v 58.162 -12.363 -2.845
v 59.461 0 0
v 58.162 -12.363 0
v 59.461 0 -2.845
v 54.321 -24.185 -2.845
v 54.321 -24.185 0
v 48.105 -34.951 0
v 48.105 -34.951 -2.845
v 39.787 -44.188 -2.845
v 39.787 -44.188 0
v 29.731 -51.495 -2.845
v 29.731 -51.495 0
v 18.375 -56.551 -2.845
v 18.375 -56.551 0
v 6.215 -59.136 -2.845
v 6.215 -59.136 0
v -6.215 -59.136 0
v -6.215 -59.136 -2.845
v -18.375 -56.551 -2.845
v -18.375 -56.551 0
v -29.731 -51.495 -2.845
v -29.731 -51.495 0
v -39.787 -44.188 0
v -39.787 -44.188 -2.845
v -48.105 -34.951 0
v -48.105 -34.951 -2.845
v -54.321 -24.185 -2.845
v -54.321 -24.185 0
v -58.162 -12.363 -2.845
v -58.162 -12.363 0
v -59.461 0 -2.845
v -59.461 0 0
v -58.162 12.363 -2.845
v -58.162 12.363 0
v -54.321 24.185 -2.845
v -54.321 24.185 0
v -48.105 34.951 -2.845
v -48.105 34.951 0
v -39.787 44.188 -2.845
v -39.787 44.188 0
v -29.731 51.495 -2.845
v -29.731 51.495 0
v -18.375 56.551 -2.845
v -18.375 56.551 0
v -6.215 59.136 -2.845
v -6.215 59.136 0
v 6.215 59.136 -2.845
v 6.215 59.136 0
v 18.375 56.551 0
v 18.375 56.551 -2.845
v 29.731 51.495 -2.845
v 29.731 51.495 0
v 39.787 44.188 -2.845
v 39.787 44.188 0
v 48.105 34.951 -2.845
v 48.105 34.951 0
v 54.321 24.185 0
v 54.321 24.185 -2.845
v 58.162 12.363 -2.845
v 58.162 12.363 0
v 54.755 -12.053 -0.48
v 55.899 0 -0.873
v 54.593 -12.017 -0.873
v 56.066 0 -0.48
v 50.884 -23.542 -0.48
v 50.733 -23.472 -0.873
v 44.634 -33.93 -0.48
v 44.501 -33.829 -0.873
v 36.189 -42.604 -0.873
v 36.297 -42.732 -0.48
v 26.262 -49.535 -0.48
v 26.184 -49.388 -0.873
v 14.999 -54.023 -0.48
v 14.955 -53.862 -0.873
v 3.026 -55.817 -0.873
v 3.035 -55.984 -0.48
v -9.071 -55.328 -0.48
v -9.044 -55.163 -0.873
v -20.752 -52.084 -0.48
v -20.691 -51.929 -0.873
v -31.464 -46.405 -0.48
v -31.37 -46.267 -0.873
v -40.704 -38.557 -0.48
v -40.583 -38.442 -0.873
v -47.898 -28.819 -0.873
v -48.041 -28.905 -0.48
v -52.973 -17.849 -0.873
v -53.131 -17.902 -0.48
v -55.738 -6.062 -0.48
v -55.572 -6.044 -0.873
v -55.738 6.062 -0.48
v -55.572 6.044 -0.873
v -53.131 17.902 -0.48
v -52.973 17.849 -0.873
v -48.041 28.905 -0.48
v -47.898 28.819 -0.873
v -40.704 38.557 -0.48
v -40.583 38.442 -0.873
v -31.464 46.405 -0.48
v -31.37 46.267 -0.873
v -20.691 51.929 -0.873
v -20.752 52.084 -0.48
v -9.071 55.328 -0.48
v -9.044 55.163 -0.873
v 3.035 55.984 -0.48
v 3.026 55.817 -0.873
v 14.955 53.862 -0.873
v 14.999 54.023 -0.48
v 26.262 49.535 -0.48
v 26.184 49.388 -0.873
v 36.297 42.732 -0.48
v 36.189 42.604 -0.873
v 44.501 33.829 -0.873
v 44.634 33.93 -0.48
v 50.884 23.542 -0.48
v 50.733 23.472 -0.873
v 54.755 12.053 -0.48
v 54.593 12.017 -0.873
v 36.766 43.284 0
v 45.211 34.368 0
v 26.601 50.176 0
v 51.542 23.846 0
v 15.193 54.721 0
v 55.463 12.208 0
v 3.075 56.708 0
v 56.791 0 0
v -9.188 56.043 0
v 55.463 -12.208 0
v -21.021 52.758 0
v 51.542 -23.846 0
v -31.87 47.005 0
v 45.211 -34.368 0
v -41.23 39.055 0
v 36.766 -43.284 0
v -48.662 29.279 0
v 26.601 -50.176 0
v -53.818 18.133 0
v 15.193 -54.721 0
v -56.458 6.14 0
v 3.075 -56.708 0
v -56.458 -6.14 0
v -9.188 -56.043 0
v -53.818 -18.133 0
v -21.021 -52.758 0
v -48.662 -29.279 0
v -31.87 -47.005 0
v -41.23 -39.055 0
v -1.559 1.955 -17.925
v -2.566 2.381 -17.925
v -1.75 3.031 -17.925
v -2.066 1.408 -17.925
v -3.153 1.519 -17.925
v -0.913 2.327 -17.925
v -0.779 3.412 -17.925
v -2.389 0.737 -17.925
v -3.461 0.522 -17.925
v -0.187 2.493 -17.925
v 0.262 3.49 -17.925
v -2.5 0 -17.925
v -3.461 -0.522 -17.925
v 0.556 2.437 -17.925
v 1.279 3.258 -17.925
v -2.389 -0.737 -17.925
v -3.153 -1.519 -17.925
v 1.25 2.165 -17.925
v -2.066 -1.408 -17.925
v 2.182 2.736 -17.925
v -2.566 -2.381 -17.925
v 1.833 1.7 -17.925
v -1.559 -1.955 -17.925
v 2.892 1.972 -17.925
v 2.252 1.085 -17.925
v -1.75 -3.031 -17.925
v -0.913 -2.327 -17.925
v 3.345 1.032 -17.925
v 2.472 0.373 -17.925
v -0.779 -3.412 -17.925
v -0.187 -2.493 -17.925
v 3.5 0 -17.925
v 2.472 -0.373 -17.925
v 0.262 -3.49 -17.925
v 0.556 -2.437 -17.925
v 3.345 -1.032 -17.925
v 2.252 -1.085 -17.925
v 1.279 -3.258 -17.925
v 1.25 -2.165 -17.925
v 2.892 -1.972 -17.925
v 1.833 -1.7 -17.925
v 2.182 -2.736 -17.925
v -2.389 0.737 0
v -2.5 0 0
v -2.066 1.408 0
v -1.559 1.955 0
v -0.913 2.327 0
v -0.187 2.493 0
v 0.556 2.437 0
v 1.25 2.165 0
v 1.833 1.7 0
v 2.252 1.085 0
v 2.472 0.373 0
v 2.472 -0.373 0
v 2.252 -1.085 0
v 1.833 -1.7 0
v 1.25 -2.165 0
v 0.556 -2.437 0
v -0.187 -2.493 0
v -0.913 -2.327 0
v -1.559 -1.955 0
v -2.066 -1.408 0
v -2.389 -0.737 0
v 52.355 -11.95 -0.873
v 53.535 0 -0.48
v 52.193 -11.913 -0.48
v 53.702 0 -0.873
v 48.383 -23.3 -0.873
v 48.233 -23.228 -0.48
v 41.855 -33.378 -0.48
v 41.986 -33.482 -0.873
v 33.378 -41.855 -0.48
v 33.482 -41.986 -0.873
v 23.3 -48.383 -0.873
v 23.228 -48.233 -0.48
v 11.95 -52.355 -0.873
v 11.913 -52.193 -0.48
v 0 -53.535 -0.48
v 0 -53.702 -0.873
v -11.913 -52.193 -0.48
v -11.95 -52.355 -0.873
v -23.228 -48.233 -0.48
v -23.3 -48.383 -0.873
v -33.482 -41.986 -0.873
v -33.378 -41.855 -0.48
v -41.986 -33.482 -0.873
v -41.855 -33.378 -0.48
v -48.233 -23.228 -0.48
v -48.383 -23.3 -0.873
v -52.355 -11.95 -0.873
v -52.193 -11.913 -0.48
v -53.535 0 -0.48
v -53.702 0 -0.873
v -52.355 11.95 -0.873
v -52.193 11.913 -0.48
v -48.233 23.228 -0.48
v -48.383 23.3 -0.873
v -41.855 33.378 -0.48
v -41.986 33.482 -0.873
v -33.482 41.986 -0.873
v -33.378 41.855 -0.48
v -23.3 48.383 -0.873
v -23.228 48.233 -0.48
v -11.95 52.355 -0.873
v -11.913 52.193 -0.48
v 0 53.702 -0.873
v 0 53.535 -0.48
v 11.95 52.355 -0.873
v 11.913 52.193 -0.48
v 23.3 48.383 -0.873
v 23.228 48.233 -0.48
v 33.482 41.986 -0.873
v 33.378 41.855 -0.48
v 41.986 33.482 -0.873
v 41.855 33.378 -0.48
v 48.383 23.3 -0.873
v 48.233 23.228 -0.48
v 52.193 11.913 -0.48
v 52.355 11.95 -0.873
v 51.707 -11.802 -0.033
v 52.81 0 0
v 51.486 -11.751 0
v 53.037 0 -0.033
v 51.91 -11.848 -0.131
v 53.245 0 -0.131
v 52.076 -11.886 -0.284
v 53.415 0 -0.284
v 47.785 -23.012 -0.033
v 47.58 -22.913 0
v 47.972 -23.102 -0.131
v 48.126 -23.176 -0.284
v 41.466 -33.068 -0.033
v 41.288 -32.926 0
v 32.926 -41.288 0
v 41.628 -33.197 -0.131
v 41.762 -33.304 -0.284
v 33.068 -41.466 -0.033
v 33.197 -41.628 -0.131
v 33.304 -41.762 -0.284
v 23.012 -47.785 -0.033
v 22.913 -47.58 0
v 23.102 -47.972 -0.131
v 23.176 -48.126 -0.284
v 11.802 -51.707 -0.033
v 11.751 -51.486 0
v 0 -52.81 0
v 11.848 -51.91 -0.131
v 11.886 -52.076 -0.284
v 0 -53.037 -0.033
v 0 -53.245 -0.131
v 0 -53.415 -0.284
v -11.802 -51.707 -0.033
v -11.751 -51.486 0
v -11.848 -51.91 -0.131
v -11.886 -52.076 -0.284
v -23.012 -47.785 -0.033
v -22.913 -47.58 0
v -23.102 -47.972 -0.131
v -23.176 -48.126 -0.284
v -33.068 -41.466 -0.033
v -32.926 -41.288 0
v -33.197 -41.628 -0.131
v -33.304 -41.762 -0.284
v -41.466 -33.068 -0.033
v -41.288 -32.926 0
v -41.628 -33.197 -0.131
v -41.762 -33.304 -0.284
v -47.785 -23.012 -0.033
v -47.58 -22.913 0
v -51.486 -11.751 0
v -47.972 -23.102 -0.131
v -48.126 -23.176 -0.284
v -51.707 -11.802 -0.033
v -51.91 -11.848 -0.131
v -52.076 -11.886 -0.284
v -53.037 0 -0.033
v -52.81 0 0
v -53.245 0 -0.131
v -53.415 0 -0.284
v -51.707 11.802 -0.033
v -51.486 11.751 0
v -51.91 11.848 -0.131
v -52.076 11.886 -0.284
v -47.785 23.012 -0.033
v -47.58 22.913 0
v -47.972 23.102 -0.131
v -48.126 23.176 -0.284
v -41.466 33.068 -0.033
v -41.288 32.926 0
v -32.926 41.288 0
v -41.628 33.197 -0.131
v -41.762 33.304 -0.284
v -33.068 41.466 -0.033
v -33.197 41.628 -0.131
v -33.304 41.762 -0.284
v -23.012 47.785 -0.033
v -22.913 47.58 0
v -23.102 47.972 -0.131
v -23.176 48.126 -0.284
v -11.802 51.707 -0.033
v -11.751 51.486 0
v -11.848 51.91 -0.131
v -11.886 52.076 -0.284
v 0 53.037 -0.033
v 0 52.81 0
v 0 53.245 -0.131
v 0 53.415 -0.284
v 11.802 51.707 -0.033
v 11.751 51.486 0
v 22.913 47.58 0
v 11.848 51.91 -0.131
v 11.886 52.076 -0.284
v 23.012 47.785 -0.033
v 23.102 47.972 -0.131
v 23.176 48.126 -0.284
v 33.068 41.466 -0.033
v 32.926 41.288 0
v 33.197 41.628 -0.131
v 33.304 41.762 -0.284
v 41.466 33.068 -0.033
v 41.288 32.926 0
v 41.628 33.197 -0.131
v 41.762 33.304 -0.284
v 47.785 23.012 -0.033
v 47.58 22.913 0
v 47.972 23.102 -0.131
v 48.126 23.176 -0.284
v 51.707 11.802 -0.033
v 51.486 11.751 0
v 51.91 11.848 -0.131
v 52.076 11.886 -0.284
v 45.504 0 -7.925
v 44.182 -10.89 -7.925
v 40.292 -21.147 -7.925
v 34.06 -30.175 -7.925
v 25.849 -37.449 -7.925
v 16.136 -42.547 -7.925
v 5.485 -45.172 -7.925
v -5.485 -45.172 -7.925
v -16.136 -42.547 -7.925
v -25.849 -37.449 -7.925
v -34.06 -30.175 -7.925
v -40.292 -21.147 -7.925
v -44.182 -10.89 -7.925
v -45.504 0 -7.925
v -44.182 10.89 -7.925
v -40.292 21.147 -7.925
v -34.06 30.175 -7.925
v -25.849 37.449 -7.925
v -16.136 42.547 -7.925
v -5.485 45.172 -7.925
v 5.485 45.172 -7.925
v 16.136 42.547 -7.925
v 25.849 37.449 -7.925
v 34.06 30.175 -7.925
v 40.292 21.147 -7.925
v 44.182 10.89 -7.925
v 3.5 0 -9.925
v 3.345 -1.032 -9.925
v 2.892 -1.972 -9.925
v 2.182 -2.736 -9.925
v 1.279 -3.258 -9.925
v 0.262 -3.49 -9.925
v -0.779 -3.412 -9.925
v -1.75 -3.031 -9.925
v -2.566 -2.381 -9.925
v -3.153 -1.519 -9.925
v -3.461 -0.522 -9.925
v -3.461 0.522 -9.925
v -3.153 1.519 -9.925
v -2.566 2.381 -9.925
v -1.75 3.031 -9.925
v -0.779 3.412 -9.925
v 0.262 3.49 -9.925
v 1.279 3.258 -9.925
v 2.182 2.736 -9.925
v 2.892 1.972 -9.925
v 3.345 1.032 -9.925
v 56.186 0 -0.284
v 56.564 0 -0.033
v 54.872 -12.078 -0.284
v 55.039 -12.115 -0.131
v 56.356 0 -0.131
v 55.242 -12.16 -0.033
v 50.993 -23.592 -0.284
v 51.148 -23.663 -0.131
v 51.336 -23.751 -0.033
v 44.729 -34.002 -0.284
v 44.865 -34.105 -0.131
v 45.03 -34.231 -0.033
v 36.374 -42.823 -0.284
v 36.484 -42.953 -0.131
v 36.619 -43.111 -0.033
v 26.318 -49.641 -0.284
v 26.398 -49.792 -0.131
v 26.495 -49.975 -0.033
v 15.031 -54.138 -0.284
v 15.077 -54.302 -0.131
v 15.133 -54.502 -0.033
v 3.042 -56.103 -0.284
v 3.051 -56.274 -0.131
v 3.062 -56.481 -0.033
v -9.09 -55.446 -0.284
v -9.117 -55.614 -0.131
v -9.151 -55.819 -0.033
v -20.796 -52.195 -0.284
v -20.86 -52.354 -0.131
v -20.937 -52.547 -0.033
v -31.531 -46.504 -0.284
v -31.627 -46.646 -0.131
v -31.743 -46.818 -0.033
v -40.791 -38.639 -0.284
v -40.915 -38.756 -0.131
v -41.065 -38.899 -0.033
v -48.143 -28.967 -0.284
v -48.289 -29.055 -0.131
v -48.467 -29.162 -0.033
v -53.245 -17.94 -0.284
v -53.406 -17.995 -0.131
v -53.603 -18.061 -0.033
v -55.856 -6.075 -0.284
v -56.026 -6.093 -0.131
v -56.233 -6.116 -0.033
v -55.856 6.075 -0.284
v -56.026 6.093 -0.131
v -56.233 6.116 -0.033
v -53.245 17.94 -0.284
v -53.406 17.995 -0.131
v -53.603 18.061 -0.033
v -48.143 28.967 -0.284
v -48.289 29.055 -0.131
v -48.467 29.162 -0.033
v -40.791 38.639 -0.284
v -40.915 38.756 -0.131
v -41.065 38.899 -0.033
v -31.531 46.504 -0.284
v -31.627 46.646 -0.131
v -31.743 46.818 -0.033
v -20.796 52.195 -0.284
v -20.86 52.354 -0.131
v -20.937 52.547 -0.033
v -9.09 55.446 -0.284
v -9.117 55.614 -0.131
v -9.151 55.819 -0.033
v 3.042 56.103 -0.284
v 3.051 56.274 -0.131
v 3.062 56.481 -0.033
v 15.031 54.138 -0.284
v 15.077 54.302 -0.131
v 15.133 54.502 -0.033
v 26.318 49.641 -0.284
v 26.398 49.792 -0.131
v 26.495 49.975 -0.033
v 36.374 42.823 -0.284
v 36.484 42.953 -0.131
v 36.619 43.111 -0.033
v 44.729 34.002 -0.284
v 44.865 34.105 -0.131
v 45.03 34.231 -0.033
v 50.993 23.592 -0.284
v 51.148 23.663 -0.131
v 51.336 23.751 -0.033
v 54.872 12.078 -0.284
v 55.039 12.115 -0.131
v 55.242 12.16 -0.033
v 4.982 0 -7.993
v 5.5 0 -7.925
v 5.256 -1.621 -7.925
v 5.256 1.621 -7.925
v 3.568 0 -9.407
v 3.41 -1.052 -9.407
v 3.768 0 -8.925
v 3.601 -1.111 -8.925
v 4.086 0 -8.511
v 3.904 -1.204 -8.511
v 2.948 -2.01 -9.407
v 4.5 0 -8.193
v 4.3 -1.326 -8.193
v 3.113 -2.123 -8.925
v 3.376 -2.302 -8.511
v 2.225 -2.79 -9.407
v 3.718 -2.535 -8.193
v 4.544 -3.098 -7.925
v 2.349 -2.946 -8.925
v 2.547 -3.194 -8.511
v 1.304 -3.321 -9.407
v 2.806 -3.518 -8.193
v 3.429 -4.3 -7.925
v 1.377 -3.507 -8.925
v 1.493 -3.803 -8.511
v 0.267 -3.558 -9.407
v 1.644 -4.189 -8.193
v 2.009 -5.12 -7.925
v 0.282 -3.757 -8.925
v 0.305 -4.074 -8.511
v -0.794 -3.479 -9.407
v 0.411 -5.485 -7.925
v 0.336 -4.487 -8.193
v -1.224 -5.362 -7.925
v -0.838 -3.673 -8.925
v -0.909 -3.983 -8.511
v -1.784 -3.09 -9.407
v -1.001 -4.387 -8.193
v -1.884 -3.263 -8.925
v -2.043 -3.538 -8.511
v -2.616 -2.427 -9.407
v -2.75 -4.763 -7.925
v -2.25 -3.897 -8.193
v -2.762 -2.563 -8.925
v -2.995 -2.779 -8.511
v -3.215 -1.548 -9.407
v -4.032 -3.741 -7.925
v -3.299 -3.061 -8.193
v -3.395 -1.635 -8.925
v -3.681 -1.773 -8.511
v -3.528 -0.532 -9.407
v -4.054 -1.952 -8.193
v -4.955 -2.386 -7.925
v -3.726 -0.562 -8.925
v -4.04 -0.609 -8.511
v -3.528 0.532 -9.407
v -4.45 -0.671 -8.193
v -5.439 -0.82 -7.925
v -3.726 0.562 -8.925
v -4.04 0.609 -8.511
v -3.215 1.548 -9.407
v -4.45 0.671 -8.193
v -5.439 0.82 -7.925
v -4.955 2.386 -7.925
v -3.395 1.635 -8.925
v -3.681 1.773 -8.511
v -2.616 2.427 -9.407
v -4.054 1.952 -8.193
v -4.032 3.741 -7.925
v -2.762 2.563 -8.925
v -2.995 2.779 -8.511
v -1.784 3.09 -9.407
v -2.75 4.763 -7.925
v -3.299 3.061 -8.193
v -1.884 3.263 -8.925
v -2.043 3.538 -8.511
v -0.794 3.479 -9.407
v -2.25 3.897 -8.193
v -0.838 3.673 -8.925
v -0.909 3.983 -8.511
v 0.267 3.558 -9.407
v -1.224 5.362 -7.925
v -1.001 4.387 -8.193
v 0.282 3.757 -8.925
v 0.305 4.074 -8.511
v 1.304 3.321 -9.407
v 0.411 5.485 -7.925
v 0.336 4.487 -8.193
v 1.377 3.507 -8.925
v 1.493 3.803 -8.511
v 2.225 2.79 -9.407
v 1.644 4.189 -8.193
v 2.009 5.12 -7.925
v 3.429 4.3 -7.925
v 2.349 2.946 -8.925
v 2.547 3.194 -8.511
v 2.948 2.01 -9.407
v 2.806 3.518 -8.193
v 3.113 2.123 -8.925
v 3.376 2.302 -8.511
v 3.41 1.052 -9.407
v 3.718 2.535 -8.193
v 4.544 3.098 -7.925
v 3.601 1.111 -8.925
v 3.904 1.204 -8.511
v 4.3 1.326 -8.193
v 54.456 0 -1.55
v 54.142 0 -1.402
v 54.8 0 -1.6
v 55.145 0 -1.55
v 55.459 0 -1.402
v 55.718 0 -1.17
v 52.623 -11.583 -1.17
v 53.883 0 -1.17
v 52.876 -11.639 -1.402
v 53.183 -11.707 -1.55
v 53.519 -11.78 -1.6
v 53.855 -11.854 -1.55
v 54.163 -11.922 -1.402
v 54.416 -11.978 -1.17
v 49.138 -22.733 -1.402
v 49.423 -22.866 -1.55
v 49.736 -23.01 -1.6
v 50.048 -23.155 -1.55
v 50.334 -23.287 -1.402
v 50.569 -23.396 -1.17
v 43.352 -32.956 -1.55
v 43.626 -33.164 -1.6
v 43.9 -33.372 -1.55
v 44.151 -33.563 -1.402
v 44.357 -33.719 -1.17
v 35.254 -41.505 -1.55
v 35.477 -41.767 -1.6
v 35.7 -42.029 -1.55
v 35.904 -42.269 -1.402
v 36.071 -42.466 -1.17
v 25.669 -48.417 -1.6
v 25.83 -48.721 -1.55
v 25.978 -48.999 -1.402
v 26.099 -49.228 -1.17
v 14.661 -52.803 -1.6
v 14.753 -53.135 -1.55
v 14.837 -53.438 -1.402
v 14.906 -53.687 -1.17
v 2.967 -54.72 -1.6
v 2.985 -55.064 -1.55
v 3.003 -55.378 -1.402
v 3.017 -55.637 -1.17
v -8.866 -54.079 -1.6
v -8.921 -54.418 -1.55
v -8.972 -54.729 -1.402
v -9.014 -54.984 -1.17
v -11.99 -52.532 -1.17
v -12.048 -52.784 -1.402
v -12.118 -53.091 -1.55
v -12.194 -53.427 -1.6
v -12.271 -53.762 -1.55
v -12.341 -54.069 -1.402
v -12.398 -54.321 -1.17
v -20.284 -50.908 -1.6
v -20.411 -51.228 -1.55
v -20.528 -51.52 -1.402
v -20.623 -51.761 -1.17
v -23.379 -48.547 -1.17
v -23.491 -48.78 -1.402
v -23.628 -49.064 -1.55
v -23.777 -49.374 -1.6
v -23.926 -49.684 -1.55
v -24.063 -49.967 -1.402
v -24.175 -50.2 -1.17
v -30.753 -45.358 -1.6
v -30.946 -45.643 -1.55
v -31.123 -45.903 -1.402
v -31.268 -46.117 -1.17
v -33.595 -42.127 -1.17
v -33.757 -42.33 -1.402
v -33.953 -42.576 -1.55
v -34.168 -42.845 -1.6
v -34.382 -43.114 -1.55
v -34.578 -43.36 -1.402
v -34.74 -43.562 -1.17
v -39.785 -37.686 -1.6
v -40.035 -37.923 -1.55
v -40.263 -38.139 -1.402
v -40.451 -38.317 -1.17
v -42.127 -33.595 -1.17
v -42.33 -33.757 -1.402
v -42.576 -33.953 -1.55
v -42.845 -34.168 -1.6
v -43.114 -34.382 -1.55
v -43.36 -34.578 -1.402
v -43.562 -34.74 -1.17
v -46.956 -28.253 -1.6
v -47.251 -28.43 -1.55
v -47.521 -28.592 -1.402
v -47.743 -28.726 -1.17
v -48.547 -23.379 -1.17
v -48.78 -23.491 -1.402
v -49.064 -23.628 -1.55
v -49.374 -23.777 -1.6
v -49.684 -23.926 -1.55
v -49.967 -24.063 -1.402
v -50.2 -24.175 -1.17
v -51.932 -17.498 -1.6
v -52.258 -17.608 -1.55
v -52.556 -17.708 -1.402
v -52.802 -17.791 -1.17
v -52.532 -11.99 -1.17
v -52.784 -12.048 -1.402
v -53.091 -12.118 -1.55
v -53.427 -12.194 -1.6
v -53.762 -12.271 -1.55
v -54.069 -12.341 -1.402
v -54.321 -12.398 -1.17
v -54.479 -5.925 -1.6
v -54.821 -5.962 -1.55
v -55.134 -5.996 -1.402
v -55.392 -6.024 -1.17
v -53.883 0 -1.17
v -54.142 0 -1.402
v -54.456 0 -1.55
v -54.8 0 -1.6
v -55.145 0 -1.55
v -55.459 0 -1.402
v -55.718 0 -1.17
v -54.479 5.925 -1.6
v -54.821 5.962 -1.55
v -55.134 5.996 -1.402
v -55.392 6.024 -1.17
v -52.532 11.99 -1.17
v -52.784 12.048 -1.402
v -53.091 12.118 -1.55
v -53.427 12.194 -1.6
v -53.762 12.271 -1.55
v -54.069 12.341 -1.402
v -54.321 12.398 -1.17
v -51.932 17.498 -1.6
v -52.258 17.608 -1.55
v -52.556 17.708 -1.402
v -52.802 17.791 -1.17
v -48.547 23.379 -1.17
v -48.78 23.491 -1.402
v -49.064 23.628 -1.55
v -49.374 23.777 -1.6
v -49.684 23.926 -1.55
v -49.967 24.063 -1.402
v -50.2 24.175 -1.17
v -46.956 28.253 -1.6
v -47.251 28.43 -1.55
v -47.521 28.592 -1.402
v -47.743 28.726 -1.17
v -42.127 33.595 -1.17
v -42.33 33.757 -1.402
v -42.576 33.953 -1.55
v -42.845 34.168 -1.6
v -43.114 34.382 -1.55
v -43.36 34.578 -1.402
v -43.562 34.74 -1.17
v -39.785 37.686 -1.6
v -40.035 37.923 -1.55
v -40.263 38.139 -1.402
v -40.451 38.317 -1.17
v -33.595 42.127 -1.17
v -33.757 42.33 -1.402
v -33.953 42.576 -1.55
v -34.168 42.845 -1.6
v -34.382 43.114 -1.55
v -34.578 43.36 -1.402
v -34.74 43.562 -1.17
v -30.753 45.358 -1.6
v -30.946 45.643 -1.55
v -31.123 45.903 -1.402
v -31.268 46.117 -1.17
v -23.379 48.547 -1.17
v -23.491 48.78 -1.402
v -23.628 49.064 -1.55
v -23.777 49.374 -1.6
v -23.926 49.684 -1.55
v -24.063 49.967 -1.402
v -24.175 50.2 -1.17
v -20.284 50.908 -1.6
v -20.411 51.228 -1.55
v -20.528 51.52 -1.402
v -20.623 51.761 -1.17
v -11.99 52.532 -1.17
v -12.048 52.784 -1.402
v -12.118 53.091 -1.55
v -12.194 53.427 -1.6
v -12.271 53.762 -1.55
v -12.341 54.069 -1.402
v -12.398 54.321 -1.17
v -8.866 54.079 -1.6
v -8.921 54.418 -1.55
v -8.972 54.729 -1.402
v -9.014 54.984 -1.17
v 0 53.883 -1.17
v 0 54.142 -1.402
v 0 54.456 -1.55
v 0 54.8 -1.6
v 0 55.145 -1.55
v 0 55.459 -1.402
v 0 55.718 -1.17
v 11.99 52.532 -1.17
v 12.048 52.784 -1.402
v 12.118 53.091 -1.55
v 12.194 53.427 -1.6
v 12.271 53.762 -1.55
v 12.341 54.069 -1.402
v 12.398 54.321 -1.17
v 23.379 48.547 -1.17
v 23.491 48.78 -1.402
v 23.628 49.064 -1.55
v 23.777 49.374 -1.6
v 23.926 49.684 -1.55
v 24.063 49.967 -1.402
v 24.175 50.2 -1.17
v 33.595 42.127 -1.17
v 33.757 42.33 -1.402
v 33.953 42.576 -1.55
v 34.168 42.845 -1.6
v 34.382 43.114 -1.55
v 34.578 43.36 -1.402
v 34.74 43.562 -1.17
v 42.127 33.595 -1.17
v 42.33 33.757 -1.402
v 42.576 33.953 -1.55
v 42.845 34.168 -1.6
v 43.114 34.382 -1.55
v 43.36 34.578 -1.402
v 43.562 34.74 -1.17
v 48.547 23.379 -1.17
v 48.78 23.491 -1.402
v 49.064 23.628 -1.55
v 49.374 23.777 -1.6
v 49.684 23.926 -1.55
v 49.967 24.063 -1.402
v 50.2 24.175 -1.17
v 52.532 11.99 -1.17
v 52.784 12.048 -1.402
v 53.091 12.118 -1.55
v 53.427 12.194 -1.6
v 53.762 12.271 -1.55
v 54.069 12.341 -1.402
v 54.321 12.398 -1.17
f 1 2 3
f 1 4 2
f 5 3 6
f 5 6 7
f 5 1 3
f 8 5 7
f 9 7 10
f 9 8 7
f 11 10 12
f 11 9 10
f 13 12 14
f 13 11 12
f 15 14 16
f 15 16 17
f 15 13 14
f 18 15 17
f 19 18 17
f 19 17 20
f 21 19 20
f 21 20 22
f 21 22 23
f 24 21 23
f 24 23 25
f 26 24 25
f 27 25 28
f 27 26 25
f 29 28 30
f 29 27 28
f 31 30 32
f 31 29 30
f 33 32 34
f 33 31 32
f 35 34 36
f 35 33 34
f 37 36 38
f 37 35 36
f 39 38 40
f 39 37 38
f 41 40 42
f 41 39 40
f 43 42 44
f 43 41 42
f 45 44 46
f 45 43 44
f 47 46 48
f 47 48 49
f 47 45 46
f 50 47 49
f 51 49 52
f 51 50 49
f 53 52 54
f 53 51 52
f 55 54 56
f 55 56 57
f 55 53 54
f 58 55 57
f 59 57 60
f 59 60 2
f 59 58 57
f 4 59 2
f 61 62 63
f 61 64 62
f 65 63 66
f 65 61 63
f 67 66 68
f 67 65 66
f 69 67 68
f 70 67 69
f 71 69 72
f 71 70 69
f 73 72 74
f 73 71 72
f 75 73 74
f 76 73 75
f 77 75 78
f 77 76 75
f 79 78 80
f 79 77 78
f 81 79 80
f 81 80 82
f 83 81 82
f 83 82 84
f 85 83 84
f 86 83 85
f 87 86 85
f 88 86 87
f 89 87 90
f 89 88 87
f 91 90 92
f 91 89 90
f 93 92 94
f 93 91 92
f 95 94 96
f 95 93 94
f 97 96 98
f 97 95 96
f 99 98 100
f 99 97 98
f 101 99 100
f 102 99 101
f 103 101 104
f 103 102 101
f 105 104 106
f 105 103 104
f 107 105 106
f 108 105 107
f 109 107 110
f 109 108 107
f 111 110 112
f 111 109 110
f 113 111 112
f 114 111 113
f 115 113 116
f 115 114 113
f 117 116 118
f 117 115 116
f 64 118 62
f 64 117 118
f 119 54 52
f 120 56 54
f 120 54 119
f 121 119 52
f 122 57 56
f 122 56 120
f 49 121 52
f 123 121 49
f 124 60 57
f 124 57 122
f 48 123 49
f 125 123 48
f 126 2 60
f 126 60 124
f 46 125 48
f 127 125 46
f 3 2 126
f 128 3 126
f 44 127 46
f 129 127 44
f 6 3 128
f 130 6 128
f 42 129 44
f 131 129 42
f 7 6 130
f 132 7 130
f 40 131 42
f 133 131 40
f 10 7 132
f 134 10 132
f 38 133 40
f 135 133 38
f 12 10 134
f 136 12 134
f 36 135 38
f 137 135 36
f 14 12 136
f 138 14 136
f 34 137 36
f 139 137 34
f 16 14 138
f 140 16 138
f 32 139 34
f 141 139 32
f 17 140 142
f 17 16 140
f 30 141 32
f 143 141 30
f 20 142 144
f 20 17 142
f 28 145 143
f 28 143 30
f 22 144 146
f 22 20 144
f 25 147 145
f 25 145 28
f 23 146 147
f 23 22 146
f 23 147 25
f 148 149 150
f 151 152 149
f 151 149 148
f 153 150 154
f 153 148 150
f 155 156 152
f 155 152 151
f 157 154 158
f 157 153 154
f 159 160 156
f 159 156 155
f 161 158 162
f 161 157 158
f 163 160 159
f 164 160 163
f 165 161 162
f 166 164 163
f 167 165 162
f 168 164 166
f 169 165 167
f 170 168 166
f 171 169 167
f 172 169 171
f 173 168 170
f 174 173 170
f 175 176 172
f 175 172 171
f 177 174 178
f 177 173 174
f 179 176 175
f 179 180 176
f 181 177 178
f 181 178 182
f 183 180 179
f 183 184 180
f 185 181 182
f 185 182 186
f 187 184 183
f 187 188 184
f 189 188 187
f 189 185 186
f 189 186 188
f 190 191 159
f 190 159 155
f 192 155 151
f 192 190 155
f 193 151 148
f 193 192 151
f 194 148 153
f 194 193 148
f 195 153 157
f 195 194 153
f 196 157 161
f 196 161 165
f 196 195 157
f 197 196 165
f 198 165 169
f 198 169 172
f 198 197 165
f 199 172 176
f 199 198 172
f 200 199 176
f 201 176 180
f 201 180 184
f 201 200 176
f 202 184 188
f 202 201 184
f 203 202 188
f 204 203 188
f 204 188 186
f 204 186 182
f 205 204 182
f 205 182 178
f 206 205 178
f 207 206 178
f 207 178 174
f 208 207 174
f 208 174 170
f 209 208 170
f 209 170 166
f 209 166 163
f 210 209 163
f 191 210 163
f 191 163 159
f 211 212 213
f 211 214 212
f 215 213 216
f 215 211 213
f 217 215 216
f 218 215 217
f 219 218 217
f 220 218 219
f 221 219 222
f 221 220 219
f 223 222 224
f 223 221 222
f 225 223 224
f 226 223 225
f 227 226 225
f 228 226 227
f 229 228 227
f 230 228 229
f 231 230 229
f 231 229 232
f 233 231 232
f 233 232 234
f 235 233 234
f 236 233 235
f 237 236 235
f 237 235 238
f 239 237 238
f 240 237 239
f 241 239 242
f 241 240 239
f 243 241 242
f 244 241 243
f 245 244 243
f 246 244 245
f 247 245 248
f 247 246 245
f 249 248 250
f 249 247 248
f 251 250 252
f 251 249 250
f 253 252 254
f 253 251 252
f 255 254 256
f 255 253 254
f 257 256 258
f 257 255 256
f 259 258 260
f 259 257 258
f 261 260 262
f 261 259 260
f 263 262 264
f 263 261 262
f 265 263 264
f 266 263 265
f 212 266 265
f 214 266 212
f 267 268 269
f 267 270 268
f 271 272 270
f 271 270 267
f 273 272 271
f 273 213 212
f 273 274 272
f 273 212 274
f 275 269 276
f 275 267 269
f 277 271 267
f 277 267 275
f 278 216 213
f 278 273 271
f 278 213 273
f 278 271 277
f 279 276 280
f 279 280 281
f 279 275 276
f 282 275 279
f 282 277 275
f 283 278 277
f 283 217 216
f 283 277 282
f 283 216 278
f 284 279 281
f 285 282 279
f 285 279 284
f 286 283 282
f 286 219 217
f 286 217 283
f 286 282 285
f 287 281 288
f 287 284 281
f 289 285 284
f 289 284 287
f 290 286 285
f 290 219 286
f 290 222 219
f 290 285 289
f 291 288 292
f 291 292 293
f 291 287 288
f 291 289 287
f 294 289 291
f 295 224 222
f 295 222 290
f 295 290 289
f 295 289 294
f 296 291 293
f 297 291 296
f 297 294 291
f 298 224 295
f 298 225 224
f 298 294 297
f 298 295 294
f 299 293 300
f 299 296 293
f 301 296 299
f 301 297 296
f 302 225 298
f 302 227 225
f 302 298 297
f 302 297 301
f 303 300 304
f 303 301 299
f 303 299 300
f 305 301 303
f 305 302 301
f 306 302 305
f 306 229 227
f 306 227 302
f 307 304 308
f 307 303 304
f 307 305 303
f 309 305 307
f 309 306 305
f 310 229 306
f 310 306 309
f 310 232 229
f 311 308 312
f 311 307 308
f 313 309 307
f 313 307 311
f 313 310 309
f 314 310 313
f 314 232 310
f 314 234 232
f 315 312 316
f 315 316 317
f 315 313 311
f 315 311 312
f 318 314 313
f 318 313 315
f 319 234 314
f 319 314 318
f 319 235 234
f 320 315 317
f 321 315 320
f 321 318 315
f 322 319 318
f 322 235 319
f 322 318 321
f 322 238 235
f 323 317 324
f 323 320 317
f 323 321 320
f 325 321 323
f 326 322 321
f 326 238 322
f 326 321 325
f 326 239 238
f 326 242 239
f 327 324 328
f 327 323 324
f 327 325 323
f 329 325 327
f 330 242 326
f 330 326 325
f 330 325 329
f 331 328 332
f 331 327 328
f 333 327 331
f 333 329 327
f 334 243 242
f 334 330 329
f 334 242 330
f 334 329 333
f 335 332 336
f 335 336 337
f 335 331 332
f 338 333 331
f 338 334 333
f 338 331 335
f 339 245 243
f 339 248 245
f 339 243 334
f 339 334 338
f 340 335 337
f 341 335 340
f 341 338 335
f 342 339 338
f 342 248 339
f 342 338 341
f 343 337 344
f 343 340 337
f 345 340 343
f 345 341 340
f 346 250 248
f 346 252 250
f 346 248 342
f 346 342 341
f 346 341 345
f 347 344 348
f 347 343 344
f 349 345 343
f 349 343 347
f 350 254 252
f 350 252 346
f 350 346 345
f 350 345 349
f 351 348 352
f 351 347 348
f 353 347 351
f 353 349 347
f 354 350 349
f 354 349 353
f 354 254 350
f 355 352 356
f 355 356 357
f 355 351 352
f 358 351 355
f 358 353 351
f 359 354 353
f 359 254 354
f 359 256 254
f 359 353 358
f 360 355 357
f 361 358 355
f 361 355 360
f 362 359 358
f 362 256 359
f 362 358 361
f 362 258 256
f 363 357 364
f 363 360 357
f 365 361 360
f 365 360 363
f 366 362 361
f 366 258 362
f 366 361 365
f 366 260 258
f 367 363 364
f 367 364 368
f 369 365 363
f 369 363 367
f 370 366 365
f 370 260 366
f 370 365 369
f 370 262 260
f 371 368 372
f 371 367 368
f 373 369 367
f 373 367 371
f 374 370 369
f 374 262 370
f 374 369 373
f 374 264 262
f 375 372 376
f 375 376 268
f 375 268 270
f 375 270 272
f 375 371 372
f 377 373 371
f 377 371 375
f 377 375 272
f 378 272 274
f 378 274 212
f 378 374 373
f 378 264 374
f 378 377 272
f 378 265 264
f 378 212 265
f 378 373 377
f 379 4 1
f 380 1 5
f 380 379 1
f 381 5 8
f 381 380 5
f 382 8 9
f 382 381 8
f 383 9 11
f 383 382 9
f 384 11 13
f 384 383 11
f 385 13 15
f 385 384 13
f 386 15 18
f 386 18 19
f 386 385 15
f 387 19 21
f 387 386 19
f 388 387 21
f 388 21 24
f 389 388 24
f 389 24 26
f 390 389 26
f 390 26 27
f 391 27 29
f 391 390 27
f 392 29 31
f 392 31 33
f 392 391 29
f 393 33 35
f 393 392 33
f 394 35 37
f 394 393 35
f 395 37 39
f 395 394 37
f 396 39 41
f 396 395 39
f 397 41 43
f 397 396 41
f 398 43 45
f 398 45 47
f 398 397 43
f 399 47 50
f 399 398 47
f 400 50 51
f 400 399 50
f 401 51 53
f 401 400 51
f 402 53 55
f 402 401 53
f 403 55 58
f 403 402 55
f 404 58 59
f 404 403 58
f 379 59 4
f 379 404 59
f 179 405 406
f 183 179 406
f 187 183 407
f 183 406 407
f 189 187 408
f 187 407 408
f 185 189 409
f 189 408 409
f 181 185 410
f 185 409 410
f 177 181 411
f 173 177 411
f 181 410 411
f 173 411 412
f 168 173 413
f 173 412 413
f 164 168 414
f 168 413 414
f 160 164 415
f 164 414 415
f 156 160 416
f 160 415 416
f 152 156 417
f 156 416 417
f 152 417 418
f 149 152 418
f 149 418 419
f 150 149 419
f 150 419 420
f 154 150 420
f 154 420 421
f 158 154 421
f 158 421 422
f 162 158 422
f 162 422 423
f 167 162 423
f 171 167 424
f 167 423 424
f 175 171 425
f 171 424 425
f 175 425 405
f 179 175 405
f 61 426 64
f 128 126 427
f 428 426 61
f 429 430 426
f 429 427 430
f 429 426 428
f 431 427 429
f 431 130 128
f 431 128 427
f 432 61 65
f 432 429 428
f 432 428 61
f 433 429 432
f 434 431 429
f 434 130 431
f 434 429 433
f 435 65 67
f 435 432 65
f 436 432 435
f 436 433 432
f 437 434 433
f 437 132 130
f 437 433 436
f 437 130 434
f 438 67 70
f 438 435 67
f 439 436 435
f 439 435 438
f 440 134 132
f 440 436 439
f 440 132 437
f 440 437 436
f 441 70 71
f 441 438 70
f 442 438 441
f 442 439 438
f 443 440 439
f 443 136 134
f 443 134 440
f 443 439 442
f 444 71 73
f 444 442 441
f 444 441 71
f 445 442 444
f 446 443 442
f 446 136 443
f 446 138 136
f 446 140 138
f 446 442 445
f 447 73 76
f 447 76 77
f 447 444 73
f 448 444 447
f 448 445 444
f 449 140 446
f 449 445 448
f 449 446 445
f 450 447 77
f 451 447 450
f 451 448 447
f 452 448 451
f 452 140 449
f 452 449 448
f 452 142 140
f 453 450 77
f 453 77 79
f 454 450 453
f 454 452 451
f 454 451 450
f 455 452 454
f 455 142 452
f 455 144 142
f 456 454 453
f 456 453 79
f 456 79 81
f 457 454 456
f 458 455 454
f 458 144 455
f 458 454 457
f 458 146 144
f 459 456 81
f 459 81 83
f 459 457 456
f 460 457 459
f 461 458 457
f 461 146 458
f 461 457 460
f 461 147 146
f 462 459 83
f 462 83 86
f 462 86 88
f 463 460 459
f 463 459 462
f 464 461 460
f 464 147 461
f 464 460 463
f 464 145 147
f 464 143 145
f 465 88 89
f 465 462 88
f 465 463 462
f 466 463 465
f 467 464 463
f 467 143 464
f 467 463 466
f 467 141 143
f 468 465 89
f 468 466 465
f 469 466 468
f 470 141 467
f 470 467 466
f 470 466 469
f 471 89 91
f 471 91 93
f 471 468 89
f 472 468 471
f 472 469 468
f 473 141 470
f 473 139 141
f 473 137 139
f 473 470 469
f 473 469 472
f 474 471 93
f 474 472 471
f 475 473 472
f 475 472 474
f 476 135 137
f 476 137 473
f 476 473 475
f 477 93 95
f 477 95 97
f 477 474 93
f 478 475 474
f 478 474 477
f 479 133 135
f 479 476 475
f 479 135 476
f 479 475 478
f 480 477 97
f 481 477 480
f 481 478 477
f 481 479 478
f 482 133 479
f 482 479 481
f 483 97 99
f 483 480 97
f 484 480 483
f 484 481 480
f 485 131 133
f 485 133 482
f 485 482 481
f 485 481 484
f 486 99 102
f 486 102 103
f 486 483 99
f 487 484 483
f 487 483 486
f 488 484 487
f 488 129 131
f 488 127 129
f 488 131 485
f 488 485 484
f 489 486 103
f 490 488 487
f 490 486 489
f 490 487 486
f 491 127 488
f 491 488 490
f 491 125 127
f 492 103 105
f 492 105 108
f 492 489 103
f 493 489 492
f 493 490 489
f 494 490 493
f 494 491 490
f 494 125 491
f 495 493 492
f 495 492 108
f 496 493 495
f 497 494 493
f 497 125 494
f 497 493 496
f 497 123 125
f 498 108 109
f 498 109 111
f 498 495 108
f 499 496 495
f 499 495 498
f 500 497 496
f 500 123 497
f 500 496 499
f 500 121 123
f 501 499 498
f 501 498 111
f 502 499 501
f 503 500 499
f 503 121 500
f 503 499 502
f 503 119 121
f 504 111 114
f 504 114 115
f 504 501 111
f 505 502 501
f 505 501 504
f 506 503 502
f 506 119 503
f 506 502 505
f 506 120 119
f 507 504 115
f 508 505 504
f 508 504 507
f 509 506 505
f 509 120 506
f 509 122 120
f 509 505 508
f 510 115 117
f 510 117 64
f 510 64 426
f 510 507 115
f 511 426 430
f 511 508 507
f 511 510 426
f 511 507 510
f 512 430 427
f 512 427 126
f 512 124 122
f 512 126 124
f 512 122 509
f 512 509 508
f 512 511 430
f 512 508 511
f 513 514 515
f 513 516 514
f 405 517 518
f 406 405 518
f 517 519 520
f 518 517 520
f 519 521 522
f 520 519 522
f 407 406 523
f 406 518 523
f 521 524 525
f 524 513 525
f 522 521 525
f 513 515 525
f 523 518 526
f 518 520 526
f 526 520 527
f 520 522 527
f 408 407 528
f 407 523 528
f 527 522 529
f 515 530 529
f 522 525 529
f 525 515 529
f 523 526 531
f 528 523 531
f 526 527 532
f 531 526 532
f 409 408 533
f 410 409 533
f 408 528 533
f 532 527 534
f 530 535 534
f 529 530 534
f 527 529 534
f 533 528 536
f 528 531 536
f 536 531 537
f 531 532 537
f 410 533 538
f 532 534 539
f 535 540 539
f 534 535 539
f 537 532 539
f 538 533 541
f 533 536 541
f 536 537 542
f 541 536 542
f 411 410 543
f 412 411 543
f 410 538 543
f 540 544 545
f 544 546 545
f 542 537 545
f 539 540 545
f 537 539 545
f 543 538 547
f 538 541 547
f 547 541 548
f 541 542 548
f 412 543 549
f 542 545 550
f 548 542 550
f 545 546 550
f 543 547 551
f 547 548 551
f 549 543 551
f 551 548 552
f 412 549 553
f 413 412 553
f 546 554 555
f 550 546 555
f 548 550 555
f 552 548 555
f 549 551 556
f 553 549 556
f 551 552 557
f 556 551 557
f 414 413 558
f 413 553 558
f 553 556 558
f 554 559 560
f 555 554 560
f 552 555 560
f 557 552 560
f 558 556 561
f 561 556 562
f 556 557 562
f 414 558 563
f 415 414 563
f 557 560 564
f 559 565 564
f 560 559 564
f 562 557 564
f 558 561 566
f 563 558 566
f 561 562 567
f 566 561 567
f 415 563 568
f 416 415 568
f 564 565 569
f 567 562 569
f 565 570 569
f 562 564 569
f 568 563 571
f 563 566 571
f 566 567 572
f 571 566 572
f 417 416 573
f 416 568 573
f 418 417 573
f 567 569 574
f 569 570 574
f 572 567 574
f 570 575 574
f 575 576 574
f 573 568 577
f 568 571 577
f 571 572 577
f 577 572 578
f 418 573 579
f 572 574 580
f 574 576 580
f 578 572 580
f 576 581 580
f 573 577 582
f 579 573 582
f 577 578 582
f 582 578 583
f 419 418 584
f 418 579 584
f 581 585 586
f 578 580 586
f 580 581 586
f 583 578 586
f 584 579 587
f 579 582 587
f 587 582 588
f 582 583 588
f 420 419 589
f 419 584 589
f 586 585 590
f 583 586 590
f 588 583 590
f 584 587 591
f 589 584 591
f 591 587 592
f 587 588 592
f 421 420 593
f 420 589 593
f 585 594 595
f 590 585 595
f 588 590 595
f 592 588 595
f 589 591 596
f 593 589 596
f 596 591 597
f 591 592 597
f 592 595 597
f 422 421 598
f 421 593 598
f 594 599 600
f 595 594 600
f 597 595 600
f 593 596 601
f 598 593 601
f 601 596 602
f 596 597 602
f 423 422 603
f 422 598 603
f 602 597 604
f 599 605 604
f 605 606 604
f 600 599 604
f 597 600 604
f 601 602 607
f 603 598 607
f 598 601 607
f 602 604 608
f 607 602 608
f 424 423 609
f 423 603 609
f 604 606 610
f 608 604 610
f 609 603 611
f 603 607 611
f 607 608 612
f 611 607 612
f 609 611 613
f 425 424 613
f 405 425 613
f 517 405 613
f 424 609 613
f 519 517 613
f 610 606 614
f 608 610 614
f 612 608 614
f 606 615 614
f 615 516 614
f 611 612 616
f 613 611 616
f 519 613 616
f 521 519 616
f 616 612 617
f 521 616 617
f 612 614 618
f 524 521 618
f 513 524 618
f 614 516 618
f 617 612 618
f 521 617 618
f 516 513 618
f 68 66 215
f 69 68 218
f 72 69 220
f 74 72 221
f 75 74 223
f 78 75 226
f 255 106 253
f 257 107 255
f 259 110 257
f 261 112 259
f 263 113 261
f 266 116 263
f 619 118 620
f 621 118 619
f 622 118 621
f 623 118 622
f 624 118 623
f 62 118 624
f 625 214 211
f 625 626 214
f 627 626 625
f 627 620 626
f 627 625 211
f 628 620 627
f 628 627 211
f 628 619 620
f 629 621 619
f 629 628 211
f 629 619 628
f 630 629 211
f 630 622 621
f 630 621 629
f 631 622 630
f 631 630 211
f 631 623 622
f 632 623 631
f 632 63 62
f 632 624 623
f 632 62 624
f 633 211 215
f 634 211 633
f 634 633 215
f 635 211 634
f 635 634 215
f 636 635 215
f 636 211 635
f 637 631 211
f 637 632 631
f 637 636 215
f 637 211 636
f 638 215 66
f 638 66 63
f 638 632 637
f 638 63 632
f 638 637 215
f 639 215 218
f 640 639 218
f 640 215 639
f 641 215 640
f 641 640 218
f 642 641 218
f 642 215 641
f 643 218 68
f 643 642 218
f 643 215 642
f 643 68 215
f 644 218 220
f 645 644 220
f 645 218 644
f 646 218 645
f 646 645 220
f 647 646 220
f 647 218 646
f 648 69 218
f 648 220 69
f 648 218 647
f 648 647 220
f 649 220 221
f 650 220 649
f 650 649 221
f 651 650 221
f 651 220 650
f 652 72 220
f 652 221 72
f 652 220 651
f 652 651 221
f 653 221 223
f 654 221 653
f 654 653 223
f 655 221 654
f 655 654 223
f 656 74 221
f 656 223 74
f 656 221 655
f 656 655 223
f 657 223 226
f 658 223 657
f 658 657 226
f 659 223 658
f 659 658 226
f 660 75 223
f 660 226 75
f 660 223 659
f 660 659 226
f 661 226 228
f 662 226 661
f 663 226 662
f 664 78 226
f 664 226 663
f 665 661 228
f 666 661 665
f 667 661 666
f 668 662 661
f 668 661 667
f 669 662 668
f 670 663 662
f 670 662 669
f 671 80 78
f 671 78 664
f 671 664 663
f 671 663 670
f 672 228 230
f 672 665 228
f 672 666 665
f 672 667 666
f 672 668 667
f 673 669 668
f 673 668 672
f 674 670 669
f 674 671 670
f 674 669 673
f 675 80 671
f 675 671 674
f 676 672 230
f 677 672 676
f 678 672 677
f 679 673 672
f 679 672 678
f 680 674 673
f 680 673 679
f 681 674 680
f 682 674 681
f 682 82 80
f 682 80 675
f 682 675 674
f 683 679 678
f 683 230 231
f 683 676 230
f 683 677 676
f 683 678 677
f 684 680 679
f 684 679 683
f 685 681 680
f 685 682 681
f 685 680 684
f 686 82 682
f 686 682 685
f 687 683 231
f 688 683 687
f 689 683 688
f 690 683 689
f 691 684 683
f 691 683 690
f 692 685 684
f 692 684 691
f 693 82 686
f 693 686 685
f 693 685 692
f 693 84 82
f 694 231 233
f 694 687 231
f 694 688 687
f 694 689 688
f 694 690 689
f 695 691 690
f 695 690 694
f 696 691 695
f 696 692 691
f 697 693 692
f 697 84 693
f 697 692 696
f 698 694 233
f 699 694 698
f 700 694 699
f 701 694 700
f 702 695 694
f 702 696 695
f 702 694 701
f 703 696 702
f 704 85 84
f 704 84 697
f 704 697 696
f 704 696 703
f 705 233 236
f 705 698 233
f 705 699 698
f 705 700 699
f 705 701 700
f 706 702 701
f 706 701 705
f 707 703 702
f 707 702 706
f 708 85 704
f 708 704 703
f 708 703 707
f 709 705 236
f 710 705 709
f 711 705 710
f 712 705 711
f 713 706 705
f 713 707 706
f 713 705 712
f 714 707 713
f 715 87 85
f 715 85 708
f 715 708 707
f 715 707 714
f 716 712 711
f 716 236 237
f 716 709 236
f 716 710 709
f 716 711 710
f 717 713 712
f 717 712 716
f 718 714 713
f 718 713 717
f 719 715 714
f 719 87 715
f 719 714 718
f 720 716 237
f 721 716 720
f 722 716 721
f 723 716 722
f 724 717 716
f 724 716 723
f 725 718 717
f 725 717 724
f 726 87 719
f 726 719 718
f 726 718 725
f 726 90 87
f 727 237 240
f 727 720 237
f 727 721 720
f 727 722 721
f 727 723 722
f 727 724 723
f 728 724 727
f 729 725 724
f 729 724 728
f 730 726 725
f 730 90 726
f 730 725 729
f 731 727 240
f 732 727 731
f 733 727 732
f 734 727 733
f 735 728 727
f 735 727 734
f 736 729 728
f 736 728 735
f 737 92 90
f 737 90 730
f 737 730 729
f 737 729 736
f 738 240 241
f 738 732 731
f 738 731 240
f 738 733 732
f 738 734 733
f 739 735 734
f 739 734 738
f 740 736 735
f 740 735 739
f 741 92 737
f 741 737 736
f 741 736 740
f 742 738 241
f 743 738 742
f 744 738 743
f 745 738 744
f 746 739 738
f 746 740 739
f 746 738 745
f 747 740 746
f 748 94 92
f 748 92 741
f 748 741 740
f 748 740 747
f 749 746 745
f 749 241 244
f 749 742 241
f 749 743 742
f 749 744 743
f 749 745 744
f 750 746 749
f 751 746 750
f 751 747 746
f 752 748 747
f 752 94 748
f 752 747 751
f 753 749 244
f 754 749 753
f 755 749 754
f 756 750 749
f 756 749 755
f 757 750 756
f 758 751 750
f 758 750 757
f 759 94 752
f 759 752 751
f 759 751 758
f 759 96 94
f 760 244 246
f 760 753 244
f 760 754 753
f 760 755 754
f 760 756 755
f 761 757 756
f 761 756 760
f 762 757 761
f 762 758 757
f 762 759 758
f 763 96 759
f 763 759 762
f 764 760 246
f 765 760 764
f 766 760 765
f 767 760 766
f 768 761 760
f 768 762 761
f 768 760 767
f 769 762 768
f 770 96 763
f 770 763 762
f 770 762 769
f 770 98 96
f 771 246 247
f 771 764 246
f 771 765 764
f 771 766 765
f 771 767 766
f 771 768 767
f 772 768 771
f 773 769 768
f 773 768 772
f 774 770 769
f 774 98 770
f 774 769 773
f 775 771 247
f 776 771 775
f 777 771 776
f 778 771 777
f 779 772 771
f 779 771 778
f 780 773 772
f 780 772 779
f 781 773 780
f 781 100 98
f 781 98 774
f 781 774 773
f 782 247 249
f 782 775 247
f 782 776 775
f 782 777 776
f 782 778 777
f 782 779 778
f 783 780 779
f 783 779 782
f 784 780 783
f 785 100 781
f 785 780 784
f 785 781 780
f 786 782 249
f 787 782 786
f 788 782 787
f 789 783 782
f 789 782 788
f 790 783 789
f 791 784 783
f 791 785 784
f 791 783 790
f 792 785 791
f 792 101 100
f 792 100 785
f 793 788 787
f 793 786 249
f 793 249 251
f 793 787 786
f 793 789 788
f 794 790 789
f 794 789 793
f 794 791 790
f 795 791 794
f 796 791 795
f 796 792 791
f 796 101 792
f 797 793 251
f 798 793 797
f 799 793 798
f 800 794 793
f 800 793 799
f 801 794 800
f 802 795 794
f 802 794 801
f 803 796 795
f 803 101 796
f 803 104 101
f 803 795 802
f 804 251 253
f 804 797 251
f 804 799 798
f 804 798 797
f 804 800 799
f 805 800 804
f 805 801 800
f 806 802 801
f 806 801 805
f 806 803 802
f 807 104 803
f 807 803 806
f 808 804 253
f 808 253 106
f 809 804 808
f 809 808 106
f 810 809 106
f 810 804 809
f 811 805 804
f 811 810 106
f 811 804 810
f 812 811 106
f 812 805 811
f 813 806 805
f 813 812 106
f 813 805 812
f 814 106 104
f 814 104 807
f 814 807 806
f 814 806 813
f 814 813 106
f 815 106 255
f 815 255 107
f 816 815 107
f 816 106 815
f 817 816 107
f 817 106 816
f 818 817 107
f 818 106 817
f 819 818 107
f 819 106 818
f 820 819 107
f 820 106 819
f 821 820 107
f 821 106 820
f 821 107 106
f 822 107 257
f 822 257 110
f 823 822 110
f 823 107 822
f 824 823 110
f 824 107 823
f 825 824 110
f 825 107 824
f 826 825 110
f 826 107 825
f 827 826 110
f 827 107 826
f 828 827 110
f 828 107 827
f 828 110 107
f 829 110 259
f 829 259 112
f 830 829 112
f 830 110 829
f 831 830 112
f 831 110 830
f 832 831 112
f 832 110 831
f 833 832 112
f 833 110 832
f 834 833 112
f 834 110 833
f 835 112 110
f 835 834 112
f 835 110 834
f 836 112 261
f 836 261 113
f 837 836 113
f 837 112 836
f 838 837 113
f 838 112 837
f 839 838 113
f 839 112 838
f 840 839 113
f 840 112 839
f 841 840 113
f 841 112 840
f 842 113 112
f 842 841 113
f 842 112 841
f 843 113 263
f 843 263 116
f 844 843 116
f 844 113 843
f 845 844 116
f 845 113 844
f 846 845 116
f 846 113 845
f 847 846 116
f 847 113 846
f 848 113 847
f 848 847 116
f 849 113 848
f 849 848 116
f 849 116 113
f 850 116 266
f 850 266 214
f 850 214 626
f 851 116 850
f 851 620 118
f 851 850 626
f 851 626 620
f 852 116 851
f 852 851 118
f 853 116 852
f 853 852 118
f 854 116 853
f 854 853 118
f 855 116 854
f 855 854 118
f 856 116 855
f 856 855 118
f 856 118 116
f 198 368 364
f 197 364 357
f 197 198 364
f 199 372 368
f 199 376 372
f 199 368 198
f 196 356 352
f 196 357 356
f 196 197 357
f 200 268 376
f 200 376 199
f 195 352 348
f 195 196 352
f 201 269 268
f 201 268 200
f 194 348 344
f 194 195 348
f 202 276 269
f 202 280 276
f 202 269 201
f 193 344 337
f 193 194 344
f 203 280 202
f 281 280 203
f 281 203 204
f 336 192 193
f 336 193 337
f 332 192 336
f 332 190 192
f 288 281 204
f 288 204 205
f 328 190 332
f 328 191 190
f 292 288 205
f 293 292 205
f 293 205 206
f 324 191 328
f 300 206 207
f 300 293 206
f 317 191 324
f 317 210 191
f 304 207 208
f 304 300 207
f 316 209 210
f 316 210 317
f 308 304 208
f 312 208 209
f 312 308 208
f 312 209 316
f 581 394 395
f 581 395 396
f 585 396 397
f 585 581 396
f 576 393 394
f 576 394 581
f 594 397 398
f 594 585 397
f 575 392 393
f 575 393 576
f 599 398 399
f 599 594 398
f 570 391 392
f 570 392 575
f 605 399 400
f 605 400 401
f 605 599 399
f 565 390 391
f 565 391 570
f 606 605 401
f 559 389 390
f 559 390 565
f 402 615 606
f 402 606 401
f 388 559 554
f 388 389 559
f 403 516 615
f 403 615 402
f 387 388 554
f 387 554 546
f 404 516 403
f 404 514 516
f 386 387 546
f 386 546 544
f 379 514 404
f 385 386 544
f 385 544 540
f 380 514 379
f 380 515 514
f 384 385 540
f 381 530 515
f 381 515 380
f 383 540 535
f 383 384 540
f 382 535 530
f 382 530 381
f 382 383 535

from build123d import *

# Parameters (mm, degrees)
SKETCH2_R               = 3.5
SKETCH2_R_2             = 2.5
BOSS_EXTRUDE1_DEPTH     = 10
CUT_EXTRUDE1_DEPTH      = 85.683624036
CUT_EXTRUDE1_DEPTH_BACK = 85.683624036
SKETCH3_R               = 2.5
FILLET1_R               = 2


with BuildPart() as part:
    # Sketch1 → Revolve1 (revolve)
    with BuildSketch(Plane(origin=(0, 0, 0), x_dir=(0, 0, -1), z_dir=(1, 0, 0)), mode=Mode.PRIVATE) as revolve1_sk:
        with BuildLine():
            Line((0, 0), (0, 52.809927725))
            ThreePointArc((0, 52.809927725), (0.130798304, 53.244522907), (0.479738309, 53.534733247))
            Line((0.479738309, 53.534733247), (0.872854821, 53.701601306))
            ThreePointArc((0.872854821, 53.701601306), (1.6002, 54.8005), (0.872854821, 55.899398694))
            Line((0.872854821, 55.899398694), (0.479738309, 56.066266753))
            ThreePointArc((0.479738309, 56.066266753), (0.130798304, 56.356477093), (0, 56.791072275))
            Line((0, 56.791072275), (0, 59.4614))
            Line((0, 59.4614), (2.8448, 59.4614))
            Line((2.8448, 59.4614), (7.9248, 45.504214709))
            Line((7.9248, 45.504214709), (7.9248, 0))
            Line((7.9248, 0), (0, 0))
        make_face()
    revolve(revolve1_sk.sketch.rotate(Axis((0, 0, 0), (0, 0, -1)), 90), axis=Axis((0, 0, 0), (0, 0, -1)))

    # Sketch2 → Boss-Extrude1 (add)
    with BuildSketch(Plane(origin=(0, 0, -7.9248), x_dir=(-1, 0, 0), z_dir=(0, 0, -1))):
        with Locations(Location((0, 0, 0), (0, 0, 180))):
            Circle(SKETCH2_R)
        Circle(SKETCH2_R_2, mode=Mode.SUBTRACT)
    extrude(amount=BOSS_EXTRUDE1_DEPTH)

    # Sketch3 → Cut-Extrude1 (cut, two sides: drawn at the far end of the back side and taken through both)
    with BuildSketch(Plane(origin=(0, 0, -7.9248), x_dir=(-1, 0, 0), z_dir=(0, 0, -1)).offset(-CUT_EXTRUDE1_DEPTH_BACK)):
        Circle(SKETCH3_R)
    extrude(amount=CUT_EXTRUDE1_DEPTH + CUT_EXTRUDE1_DEPTH_BACK, mode=Mode.SUBTRACT)

    # Fillet1
    fillet1_edges = [part.edges().sort_by_distance(p)[0] for p in [
        (-3.5, 0, -7.9248),
    ]]
    fillet(fillet1_edges, radius=FILLET1_R)


solid = part.part
